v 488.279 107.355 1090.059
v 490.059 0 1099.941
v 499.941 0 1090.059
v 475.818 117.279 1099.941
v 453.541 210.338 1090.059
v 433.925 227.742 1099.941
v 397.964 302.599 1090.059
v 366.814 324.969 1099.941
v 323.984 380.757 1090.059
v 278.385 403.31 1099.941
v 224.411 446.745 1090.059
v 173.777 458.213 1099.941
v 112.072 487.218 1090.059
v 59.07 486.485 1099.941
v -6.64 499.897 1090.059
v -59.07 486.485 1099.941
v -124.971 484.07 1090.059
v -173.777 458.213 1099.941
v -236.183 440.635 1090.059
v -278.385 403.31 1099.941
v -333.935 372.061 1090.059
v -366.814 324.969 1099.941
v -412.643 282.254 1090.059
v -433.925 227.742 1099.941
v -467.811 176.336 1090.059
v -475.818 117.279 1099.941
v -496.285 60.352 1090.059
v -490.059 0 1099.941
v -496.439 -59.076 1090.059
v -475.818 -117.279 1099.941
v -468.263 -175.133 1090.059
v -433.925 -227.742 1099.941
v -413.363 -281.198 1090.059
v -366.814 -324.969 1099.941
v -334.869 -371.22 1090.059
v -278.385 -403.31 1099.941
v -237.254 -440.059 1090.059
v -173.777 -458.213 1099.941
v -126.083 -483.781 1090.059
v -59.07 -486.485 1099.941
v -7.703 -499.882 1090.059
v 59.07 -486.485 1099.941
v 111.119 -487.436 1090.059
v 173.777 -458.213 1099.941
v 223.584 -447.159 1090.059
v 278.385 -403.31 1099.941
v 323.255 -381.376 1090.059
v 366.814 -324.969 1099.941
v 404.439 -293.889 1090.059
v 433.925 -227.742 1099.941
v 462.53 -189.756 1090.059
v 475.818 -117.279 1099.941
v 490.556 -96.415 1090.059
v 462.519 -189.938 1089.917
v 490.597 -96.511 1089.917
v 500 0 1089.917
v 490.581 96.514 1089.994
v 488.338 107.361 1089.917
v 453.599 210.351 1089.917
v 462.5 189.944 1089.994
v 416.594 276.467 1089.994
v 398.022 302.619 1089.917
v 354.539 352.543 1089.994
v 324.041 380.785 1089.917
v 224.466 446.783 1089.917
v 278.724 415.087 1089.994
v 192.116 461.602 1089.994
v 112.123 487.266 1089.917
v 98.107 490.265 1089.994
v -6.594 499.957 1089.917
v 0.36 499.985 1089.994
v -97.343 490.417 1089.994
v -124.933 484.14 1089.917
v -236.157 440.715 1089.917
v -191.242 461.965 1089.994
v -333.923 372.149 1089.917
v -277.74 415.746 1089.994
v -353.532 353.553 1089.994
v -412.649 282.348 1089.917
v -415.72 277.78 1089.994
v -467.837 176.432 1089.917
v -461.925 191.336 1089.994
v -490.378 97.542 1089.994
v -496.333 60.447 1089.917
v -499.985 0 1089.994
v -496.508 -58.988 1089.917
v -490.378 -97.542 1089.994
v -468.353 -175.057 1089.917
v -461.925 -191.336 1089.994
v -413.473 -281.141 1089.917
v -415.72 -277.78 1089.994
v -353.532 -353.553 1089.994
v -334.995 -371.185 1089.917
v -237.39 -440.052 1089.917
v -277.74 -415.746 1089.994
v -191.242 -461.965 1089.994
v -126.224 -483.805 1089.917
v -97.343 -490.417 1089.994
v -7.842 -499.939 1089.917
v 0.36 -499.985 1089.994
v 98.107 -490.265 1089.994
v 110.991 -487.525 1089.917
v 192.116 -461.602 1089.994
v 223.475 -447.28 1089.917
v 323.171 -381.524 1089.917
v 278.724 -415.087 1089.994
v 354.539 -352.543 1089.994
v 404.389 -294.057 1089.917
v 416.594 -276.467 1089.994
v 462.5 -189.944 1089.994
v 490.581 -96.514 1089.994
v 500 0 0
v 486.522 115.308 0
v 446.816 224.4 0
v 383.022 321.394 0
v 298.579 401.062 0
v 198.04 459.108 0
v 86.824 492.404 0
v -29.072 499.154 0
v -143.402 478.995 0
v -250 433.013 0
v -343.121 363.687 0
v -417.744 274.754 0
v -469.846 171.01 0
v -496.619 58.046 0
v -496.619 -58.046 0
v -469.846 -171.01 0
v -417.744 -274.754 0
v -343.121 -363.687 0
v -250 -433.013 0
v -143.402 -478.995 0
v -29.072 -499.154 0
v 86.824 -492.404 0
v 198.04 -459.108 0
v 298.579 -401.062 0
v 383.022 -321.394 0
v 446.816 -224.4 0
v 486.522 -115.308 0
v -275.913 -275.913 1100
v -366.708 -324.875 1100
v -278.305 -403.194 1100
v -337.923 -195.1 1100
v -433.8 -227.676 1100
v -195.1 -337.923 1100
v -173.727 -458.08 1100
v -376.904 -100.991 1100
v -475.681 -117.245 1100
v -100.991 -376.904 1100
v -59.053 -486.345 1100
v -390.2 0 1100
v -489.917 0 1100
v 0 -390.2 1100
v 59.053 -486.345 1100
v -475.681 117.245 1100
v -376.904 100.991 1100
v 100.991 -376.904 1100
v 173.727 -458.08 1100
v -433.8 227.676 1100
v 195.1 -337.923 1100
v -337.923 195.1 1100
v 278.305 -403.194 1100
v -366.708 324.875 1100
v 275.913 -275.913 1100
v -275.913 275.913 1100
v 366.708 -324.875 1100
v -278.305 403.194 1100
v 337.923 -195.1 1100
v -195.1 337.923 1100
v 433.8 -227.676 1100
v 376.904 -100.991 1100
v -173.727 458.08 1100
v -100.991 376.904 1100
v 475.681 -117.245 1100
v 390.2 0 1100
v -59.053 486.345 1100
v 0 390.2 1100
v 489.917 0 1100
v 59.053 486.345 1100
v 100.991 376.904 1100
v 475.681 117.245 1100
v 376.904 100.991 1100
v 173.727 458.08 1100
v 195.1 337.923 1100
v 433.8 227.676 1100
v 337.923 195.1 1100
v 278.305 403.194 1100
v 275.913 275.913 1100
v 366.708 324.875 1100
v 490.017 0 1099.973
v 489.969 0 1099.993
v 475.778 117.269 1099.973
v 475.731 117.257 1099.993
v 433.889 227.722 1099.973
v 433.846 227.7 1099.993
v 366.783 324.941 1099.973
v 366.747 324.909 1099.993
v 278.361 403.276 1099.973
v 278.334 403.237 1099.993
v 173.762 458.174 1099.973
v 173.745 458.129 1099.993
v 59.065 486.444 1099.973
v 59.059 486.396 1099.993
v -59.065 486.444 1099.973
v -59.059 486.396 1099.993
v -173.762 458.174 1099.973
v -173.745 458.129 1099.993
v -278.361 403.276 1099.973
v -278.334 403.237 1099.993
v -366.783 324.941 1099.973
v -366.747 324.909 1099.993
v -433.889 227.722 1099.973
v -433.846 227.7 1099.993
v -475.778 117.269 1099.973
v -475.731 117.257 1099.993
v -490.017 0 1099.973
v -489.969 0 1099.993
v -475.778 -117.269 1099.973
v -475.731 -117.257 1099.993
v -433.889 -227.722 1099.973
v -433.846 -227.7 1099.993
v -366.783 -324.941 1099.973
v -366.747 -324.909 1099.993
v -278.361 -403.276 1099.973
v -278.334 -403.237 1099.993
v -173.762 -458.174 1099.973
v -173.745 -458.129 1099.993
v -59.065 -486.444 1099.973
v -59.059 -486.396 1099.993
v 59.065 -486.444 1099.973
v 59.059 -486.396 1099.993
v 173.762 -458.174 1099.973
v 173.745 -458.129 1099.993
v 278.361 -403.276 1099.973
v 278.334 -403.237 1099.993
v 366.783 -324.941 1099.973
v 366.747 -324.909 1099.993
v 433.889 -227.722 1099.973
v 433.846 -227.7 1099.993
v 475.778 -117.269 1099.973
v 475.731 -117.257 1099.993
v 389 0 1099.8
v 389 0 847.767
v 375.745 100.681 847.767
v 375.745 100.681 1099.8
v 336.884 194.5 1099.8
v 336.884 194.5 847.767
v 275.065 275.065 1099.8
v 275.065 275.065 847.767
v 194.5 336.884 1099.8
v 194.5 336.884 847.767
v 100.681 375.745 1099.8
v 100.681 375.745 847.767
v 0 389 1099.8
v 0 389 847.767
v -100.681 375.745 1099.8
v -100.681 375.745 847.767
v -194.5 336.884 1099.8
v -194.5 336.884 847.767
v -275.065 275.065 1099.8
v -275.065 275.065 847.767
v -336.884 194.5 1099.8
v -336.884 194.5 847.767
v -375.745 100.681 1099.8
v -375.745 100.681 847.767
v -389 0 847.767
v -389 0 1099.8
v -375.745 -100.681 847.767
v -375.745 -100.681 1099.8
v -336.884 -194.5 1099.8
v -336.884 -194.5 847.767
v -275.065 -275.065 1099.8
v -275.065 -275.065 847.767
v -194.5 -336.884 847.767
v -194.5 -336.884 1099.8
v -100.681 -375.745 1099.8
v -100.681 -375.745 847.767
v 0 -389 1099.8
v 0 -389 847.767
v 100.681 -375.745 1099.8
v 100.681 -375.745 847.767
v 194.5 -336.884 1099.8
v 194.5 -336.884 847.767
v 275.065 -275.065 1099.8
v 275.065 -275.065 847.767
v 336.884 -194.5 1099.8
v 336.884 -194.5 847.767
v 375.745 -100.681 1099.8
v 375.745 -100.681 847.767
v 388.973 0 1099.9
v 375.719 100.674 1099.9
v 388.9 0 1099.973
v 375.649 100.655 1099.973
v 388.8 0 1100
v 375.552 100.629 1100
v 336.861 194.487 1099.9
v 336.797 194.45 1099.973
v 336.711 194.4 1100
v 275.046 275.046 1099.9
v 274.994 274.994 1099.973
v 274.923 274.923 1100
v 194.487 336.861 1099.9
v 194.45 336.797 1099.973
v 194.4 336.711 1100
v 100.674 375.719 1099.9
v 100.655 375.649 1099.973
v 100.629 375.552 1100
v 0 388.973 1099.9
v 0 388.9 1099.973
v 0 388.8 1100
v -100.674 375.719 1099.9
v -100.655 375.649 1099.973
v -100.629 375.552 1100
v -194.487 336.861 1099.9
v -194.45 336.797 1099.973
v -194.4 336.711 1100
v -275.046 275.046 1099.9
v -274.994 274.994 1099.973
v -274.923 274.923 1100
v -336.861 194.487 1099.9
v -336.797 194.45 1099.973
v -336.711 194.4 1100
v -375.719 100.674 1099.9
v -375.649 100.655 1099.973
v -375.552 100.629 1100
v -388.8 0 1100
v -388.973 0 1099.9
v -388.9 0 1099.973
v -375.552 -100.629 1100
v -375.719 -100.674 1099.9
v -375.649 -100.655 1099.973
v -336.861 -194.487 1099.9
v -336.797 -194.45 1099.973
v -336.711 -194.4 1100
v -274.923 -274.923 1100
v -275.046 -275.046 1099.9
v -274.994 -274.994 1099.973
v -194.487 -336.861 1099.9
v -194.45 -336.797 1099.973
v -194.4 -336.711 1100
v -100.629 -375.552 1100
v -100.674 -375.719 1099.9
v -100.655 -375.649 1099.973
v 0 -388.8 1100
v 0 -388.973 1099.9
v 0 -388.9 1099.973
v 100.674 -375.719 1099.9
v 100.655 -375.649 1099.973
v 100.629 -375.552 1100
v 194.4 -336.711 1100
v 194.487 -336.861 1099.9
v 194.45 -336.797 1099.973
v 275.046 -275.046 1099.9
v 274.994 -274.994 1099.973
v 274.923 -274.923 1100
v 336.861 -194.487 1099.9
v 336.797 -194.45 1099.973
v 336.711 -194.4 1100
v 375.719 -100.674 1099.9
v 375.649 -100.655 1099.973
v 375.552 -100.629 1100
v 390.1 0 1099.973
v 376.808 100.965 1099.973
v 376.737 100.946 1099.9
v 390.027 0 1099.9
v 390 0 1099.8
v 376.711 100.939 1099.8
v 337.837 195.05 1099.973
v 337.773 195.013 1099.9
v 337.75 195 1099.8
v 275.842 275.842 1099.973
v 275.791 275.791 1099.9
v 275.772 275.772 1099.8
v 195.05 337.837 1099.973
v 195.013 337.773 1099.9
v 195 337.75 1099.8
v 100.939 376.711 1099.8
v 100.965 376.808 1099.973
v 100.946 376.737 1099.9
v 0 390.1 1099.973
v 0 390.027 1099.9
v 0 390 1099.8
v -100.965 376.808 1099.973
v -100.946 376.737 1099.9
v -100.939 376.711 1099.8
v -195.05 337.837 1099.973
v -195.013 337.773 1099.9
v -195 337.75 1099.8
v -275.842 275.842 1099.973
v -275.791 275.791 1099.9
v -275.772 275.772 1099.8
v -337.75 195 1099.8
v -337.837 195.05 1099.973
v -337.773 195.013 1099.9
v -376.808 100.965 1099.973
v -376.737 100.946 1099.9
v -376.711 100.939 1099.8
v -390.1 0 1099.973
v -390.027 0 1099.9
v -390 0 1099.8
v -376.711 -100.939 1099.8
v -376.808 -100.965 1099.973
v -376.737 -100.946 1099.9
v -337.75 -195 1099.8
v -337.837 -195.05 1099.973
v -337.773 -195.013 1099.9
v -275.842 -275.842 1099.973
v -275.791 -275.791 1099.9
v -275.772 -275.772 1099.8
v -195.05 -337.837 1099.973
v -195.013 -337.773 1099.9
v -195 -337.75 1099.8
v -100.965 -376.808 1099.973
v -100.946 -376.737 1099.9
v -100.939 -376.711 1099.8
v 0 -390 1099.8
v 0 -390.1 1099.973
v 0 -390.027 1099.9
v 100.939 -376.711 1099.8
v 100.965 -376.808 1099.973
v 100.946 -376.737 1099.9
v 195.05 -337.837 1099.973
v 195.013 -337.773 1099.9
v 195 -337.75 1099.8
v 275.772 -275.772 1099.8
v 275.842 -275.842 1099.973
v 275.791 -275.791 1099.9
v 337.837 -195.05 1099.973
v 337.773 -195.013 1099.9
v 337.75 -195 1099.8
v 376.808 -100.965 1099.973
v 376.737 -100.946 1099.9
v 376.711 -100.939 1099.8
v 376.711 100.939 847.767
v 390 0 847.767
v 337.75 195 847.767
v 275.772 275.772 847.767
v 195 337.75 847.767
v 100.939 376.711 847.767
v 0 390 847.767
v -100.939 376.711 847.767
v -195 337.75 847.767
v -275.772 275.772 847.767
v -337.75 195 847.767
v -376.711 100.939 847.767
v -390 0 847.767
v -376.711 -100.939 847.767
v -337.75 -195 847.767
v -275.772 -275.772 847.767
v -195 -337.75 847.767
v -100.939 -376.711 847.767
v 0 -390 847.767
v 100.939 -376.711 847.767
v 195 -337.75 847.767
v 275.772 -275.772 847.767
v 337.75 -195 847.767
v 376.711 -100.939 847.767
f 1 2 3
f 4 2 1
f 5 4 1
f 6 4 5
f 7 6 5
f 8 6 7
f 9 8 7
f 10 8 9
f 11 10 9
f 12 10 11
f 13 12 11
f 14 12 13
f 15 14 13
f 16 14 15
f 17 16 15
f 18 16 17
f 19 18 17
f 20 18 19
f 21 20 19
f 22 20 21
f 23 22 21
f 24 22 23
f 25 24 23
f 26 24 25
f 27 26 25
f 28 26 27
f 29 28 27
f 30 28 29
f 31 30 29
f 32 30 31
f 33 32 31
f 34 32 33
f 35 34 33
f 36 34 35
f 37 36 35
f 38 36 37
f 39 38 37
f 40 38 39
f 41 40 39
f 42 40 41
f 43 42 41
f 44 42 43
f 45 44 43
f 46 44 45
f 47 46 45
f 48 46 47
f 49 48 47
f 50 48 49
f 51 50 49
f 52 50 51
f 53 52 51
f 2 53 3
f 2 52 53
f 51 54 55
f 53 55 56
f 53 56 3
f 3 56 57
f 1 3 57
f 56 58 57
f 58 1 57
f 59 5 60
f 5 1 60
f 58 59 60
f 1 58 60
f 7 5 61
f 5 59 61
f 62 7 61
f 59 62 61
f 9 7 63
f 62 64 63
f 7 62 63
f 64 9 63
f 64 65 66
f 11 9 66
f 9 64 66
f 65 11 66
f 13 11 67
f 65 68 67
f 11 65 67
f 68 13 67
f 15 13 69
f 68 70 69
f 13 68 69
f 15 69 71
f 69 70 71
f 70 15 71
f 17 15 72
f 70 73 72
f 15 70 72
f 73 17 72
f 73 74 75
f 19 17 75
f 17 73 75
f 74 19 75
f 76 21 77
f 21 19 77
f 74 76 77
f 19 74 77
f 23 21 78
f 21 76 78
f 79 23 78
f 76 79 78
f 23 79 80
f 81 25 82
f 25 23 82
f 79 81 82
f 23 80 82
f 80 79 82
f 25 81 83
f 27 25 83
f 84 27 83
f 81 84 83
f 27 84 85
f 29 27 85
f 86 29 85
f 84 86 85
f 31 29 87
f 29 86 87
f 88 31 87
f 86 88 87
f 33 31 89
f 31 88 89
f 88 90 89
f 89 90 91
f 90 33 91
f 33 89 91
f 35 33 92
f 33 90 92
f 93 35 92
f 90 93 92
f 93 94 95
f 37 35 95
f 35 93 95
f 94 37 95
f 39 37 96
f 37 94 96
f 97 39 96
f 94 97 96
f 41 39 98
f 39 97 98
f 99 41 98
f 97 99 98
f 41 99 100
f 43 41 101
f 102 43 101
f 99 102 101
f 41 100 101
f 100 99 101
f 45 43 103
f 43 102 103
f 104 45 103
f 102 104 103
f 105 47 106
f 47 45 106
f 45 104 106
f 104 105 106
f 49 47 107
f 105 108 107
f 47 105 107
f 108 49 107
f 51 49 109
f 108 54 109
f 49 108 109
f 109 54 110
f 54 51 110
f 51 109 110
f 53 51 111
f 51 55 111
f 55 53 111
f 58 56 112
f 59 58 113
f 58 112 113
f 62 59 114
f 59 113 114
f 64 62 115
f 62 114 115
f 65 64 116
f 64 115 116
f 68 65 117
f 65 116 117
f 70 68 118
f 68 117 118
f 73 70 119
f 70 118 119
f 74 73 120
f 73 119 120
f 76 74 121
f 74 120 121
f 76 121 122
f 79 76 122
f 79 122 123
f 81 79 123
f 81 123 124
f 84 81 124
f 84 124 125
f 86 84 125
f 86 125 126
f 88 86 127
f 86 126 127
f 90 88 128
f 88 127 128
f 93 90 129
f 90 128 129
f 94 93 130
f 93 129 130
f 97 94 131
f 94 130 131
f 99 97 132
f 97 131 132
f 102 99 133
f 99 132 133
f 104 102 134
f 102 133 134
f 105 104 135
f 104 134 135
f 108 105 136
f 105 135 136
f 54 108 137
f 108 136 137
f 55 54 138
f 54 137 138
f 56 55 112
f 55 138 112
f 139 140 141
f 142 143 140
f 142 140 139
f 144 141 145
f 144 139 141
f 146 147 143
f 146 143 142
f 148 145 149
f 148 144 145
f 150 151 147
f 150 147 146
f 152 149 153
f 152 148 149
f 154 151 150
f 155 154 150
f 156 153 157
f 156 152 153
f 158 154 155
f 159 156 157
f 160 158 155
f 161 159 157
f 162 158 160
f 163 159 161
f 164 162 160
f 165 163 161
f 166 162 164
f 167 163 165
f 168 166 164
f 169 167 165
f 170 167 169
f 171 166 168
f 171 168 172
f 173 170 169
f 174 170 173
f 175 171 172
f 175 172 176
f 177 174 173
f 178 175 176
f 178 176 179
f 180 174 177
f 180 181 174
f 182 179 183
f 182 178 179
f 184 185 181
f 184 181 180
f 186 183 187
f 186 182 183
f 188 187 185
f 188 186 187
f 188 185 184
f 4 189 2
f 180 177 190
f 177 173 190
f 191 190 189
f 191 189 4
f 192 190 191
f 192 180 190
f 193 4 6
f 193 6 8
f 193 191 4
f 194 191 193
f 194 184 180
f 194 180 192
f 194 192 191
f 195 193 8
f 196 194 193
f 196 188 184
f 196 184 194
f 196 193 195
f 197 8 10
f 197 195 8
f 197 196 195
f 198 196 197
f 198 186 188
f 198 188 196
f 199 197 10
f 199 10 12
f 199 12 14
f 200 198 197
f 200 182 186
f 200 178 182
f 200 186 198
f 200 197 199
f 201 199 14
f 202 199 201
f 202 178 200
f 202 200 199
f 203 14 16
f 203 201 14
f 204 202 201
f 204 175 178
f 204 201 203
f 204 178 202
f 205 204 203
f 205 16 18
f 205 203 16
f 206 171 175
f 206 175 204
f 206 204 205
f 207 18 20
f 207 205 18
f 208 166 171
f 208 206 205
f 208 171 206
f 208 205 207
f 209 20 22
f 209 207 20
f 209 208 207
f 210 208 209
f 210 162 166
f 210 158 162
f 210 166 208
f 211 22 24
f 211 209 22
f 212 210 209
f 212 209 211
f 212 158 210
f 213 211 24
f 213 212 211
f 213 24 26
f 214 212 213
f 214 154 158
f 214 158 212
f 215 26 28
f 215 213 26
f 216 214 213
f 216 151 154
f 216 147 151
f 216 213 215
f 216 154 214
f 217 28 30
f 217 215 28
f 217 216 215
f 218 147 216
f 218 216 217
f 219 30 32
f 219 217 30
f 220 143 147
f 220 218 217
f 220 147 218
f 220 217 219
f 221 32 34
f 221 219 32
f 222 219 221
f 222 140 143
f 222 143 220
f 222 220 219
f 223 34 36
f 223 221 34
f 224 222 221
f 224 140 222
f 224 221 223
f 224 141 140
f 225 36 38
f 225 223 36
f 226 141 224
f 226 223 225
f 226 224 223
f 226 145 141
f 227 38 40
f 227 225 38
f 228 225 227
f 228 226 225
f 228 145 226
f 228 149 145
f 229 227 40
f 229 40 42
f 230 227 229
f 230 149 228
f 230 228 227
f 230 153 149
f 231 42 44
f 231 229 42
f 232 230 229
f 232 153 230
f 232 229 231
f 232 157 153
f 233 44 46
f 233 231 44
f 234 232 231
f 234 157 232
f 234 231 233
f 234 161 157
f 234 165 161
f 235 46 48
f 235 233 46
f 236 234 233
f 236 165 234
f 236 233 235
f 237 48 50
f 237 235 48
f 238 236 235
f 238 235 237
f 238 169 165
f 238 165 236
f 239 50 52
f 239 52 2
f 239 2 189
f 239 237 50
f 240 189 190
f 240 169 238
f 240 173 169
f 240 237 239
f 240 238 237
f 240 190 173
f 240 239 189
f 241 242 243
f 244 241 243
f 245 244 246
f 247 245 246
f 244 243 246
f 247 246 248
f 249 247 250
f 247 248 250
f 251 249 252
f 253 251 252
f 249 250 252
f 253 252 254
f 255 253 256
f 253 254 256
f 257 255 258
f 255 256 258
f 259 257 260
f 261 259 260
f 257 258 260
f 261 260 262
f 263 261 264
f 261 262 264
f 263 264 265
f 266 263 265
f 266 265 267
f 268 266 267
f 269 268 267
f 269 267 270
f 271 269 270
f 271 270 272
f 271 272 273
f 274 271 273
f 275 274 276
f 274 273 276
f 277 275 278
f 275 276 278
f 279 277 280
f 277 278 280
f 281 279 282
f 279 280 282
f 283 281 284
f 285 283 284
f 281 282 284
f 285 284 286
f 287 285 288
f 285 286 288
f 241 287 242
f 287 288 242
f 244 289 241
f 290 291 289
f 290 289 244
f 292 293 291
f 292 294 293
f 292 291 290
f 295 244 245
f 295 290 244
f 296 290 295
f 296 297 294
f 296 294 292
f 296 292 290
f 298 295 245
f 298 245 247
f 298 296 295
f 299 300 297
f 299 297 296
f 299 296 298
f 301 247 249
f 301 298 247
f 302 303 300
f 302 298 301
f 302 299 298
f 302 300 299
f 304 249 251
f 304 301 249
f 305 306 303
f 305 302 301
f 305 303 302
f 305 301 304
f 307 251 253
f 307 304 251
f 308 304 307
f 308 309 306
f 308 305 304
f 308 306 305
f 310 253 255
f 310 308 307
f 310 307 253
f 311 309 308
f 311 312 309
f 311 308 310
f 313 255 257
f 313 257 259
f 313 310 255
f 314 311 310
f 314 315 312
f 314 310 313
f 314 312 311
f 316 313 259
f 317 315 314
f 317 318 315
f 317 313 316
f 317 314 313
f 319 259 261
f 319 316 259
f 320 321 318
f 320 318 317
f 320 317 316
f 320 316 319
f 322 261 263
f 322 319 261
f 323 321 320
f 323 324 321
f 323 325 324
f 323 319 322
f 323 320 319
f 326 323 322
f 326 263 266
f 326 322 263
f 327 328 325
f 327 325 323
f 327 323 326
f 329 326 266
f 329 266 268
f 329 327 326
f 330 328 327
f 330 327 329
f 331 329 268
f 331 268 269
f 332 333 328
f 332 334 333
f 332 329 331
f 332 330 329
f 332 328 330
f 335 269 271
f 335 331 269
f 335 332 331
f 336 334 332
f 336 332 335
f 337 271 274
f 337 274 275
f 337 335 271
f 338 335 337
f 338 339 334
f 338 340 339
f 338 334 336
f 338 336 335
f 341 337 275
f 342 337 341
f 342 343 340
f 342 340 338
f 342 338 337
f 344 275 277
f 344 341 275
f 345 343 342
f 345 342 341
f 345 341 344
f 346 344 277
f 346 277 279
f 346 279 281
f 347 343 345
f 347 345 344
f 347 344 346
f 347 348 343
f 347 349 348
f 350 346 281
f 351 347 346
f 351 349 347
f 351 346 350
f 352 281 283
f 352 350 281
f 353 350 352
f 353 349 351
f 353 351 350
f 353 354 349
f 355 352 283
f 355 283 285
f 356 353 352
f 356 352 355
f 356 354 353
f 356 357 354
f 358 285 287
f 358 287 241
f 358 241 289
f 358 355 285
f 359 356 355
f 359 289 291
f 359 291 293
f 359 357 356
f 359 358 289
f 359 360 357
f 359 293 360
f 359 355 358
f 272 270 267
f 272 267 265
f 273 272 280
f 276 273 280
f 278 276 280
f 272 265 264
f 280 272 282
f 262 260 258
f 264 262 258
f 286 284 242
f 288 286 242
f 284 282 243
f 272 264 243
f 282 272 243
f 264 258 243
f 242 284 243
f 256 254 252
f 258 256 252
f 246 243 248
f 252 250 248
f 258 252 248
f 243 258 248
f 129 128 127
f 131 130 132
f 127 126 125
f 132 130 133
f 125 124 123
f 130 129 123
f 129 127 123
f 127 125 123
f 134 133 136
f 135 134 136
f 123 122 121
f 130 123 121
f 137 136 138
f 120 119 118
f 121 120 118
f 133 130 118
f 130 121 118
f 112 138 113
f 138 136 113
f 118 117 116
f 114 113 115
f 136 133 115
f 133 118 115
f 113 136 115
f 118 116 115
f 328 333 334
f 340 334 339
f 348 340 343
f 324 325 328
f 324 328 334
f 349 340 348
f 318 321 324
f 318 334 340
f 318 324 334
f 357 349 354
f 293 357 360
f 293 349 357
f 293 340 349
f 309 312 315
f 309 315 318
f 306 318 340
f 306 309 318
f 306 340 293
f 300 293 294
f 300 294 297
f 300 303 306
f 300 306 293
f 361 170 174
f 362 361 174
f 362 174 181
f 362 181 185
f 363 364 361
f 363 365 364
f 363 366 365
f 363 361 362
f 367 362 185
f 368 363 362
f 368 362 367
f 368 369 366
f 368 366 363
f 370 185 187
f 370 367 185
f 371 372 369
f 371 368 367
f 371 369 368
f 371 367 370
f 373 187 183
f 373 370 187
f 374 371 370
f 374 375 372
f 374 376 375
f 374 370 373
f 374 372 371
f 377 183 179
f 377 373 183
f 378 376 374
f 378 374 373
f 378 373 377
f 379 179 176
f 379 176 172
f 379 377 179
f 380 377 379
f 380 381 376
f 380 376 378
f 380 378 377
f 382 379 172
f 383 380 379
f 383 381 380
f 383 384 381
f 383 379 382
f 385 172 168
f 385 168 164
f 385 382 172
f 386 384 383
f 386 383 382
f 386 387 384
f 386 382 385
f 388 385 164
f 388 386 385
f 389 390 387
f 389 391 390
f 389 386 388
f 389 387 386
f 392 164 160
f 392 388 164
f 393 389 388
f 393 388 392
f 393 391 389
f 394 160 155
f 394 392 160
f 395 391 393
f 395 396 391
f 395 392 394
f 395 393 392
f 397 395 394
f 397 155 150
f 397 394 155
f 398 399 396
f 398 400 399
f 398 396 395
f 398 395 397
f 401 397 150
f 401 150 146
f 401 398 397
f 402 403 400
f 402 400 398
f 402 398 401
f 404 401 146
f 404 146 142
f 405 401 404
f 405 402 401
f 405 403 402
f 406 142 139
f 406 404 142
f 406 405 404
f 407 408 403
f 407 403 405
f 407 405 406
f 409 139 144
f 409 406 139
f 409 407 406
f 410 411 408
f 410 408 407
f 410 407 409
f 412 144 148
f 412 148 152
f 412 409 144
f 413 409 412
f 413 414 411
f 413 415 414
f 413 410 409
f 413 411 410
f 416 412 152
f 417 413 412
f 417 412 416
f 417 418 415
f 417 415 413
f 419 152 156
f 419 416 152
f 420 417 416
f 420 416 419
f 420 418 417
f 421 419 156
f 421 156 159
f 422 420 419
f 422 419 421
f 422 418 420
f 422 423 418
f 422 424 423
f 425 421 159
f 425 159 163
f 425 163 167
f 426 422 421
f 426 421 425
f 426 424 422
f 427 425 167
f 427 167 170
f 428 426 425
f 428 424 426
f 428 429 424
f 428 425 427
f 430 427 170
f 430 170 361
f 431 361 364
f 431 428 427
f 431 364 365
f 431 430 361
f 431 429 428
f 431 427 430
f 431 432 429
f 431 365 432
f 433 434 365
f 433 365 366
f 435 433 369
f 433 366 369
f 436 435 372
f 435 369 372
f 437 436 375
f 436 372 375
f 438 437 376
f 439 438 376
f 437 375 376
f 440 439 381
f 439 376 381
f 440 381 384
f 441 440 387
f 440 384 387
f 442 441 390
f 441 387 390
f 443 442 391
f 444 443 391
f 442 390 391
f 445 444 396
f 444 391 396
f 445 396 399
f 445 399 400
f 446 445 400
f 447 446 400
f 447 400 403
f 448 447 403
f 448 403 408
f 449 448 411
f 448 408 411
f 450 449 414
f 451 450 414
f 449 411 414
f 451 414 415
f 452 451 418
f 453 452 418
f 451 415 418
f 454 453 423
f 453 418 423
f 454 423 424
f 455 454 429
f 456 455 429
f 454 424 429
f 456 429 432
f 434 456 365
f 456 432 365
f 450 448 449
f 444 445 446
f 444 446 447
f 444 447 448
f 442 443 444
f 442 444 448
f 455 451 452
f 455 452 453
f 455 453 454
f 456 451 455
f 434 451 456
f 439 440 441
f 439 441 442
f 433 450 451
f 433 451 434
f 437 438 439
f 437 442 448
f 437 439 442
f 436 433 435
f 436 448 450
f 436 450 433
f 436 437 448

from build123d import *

# Parameters (mm, degrees)
F0_R     = 500
F1_DEPTH = 1100
F2_SIZE  = 10
F3_R     = 390
F4_DEPTH = 252.23259
F5_R     = 389
F6_DEPTH = 252.23259
F7_R     = 0.2
F8_R     = 0.2


with BuildPart() as f1:
    # F0 (on Top) → F1 (new body)
    with BuildSketch(Plane.XY):
        Circle(F0_R)
    extrude(amount=F1_DEPTH)

    # F2
    f2_edges = [f1.edges().sort_by_distance(p)[0] for p in [
        (-500, 0, 1100),
    ]]
    chamfer(f2_edges, length=F2_SIZE)

    # F3 (on face) → F4 (cut)
    with BuildSketch(Plane.XY.offset(1100)):
        Circle(F3_R)
    extrude(amount=-F4_DEPTH, mode=Mode.SUBTRACT)

    # F8
    f8_edges = [f1.edges().sort_by_distance(p)[0] for p in [
        (-390, 0, 1100),
        (-490, 0, 1100),
        (-500, 0, 1090),
    ]]
    fillet(f8_edges, radius=F8_R)


with BuildPart() as f6:
    # F5 (on face) → F6 (new body, through all)
    with BuildSketch(Plane.XY.offset(847.76741)):
        Circle(F5_R)
    extrude(amount=F6_DEPTH)

    # F7
    f7_edges = [f6.edges().sort_by_distance(p)[0] for p in [
        (-389, 0, 1100),
    ]]
    fillet(f7_edges, radius=F7_R)


solid = Compound([f1.part, f6.part])
